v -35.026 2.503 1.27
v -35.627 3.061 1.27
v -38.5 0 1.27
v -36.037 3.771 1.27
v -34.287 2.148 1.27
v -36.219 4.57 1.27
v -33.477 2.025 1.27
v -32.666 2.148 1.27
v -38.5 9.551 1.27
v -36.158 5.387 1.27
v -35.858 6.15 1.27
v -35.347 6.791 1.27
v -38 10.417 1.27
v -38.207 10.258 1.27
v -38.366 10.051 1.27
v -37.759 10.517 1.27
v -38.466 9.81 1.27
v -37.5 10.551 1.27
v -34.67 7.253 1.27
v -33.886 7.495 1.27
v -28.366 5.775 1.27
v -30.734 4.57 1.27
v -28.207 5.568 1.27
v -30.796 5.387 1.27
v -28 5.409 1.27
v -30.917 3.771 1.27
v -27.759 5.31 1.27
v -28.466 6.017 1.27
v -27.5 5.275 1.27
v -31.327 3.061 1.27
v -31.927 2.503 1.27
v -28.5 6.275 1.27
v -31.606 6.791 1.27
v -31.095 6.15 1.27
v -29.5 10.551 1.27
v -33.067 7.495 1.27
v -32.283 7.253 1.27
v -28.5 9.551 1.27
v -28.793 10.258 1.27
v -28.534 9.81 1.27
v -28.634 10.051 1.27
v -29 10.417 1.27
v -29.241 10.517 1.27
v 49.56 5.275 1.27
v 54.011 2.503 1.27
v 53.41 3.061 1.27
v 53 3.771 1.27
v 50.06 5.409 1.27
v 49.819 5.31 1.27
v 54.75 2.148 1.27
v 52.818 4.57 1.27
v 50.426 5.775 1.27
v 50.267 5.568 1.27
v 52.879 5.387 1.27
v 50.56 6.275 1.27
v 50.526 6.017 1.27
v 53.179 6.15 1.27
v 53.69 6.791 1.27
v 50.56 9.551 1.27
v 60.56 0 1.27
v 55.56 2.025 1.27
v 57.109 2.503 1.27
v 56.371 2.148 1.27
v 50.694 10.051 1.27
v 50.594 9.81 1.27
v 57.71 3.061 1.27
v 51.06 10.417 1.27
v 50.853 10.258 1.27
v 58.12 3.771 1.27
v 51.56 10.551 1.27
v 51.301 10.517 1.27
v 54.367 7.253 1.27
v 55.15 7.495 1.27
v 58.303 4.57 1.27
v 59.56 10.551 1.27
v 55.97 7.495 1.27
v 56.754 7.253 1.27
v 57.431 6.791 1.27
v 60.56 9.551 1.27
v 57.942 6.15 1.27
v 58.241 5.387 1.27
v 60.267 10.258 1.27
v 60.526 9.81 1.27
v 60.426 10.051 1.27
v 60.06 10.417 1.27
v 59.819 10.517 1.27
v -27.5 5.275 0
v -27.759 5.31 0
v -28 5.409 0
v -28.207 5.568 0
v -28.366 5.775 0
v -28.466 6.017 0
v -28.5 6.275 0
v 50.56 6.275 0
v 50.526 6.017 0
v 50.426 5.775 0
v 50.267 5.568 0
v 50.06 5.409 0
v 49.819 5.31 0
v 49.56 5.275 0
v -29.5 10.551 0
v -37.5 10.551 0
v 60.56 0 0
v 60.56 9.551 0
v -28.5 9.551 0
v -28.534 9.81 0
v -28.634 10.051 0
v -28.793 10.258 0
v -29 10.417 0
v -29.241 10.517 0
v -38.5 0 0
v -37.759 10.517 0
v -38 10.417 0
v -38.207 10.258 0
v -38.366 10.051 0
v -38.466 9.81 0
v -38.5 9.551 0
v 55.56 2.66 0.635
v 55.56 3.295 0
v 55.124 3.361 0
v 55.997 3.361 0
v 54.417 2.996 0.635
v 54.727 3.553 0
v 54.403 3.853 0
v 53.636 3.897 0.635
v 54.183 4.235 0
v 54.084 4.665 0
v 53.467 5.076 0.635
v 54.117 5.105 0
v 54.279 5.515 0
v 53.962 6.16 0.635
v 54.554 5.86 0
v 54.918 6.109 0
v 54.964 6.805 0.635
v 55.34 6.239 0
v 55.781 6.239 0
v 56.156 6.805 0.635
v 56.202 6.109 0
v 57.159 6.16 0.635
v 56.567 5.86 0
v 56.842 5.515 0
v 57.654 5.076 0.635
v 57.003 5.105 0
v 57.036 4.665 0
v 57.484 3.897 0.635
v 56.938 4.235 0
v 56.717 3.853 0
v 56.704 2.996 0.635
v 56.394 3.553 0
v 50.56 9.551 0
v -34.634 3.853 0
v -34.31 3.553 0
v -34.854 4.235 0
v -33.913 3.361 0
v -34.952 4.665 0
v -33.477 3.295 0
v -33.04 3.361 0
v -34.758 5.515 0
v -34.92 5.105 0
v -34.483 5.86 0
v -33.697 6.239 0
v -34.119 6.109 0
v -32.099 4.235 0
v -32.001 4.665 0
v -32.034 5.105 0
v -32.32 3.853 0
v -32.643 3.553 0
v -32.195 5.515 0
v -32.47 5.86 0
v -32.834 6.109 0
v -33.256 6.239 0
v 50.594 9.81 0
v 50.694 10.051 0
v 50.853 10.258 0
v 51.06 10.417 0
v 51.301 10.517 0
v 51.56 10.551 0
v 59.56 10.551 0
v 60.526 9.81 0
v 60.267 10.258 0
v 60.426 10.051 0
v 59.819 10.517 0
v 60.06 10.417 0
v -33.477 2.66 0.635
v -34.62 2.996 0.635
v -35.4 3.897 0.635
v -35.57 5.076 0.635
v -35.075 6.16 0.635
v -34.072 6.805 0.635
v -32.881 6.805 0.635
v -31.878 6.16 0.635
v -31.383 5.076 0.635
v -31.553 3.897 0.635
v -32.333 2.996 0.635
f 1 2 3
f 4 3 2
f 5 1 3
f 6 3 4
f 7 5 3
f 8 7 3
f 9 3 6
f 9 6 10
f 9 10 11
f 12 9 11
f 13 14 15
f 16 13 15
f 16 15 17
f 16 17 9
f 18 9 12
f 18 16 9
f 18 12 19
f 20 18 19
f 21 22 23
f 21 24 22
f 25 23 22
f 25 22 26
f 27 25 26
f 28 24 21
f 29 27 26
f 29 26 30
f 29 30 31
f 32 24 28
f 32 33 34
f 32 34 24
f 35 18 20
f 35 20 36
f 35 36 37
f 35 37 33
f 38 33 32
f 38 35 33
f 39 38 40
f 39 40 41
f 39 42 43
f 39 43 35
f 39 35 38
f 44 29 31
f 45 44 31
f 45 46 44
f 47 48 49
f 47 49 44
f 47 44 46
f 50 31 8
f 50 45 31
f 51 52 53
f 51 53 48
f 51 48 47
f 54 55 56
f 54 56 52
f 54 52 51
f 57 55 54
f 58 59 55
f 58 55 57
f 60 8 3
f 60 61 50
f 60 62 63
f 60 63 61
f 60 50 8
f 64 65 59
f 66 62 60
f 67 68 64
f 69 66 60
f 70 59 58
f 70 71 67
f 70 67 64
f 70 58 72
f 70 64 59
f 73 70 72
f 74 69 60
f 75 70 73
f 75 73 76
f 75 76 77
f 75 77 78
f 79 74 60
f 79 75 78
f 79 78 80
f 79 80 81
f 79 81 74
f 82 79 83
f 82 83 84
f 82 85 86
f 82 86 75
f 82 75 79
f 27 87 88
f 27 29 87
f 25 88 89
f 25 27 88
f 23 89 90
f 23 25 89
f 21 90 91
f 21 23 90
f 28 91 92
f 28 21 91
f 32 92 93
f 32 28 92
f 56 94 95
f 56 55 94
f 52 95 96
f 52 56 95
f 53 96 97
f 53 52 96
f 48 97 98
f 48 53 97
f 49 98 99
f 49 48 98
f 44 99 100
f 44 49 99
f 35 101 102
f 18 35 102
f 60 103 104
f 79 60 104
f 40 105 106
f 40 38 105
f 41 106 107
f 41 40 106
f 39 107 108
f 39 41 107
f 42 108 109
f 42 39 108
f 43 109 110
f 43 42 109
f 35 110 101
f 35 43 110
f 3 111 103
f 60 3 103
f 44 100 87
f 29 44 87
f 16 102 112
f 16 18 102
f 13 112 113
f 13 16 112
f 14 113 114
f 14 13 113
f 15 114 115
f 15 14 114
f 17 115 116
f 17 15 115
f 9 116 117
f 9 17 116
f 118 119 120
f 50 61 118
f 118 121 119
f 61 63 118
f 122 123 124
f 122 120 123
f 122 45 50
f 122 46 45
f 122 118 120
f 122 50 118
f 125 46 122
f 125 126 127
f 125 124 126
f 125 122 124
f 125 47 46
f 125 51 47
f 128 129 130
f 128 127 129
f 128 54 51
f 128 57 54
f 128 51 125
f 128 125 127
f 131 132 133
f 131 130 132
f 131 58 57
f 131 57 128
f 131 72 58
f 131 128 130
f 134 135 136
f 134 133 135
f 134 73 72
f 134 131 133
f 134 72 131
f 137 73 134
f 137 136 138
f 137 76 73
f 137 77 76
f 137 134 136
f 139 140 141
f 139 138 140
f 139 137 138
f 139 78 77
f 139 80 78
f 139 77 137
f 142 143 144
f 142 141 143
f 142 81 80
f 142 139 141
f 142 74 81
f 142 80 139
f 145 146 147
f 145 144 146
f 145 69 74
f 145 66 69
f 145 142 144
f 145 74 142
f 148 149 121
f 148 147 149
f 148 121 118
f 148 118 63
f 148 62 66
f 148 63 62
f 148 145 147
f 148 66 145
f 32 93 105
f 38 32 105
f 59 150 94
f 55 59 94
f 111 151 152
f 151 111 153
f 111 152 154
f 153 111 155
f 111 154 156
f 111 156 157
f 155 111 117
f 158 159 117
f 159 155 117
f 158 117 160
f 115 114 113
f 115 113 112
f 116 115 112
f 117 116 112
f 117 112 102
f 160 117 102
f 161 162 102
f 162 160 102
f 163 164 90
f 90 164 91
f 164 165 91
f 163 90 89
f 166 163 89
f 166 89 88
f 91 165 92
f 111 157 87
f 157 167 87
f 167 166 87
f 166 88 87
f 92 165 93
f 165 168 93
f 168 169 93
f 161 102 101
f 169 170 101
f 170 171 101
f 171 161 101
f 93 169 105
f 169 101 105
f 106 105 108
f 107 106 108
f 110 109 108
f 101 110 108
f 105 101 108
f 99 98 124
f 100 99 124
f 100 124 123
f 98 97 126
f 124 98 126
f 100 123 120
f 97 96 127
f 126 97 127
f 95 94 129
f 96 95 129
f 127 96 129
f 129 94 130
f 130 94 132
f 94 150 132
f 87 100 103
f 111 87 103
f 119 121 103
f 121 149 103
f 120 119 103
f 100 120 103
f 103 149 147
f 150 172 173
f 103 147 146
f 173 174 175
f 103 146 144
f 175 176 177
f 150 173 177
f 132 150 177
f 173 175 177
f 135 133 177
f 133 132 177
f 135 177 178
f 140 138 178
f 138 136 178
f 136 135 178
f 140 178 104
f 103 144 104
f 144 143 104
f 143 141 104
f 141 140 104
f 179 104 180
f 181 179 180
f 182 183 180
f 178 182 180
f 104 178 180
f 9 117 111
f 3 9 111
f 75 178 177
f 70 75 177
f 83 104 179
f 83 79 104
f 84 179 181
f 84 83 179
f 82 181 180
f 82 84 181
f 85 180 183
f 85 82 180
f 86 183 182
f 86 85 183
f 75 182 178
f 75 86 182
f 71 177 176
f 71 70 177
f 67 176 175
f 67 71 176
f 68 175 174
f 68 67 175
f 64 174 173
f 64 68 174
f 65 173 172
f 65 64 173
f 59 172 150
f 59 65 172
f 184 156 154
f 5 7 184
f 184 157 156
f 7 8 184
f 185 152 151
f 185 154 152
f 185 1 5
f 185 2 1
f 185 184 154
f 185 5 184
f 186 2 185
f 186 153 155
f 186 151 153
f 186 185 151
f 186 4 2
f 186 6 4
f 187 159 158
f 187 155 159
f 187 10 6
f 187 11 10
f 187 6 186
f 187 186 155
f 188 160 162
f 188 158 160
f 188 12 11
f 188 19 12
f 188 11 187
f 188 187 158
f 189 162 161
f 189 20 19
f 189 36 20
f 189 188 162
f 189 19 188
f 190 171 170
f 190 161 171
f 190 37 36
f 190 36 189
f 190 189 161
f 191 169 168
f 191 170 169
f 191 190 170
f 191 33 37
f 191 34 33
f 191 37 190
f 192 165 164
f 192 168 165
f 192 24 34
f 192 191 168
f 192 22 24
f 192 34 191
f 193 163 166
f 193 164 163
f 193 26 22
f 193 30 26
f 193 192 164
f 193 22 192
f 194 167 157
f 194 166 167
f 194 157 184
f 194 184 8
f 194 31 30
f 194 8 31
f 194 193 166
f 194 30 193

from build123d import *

# Parameters (mm, degrees)
BOSS_EXTRUDE1_DEPTH                          = 1.27
FILLET1_R                                    = 1
CSK_FOR_M2_5_COUNTERSUNK_RAISED_HEAD_2_COUNT = 2
CSK_FOR_M2_5_COUNTERSUNK_RAISED_HEAD_2_PITCH = 89.03694267


with BuildPart() as part:
    # Sketch1 → Boss-Extrude1 (new body)
    with BuildSketch(Plane.XY):
        Polygon((-38.499957014, 0), (60.560042986, 0), (60.560042986, 10.550876612), (50.560042986, 10.550876612), (50.560042986, 5.275438306), (-28.499957014, 5.275438306), (-28.499957014, 10.550876612), (-38.499957014, 10.550876612), align=None)
    extrude(amount=BOSS_EXTRUDE1_DEPTH)

    # Fillet1
    fillet1_edges = [part.edges().sort_by_distance(p)[0] for p in [
        (-38.499957014, 10.550876612, 0.635),
        (-28.499957014, 10.550876612, 0.635),
        (-28.499957014, 5.275438306, 0.635),
        (50.560042986, 5.275438306, 0.635),
        (50.560042986, 10.550876612, 0.635),
        (60.560042986, 10.550876612, 0.635),
    ]]
    fillet(fillet1_edges, radius=FILLET1_R)

    # Sketch6 → CSK for M2.5 Countersunk Raised Head Screw1 (revolve, cut)
    with BuildSketch(Plane(origin=(-33.476617277, 4.775438306, 1.27), x_dir=(0, -1, 0), z_dir=(1, 0, 0))):
        Polygon((0, 0), (0, 1.27), (1.45, 1.27), (1.45, 1.3), (2.75, 0), align=None)
    csk_for_m2_5_countersunk_raised_head_scr = revolve(axis=Axis((-33.476617277, 4.775438306, 7.62), (0, 0, -1)), mode=Mode.SUBTRACT)

    # CSK for M2.5 Countersunk Raised Head 2: CSK for M2.5 Countersunk Raised Head Screw1 ×2
    with Locations(*[(i * CSK_FOR_M2_5_COUNTERSUNK_RAISED_HEAD_2_PITCH, 0, 0) for i in range(1, CSK_FOR_M2_5_COUNTERSUNK_RAISED_HEAD_2_COUNT)]):
        add(csk_for_m2_5_countersunk_raised_head_scr, mode=Mode.SUBTRACT)


solid = part.part
